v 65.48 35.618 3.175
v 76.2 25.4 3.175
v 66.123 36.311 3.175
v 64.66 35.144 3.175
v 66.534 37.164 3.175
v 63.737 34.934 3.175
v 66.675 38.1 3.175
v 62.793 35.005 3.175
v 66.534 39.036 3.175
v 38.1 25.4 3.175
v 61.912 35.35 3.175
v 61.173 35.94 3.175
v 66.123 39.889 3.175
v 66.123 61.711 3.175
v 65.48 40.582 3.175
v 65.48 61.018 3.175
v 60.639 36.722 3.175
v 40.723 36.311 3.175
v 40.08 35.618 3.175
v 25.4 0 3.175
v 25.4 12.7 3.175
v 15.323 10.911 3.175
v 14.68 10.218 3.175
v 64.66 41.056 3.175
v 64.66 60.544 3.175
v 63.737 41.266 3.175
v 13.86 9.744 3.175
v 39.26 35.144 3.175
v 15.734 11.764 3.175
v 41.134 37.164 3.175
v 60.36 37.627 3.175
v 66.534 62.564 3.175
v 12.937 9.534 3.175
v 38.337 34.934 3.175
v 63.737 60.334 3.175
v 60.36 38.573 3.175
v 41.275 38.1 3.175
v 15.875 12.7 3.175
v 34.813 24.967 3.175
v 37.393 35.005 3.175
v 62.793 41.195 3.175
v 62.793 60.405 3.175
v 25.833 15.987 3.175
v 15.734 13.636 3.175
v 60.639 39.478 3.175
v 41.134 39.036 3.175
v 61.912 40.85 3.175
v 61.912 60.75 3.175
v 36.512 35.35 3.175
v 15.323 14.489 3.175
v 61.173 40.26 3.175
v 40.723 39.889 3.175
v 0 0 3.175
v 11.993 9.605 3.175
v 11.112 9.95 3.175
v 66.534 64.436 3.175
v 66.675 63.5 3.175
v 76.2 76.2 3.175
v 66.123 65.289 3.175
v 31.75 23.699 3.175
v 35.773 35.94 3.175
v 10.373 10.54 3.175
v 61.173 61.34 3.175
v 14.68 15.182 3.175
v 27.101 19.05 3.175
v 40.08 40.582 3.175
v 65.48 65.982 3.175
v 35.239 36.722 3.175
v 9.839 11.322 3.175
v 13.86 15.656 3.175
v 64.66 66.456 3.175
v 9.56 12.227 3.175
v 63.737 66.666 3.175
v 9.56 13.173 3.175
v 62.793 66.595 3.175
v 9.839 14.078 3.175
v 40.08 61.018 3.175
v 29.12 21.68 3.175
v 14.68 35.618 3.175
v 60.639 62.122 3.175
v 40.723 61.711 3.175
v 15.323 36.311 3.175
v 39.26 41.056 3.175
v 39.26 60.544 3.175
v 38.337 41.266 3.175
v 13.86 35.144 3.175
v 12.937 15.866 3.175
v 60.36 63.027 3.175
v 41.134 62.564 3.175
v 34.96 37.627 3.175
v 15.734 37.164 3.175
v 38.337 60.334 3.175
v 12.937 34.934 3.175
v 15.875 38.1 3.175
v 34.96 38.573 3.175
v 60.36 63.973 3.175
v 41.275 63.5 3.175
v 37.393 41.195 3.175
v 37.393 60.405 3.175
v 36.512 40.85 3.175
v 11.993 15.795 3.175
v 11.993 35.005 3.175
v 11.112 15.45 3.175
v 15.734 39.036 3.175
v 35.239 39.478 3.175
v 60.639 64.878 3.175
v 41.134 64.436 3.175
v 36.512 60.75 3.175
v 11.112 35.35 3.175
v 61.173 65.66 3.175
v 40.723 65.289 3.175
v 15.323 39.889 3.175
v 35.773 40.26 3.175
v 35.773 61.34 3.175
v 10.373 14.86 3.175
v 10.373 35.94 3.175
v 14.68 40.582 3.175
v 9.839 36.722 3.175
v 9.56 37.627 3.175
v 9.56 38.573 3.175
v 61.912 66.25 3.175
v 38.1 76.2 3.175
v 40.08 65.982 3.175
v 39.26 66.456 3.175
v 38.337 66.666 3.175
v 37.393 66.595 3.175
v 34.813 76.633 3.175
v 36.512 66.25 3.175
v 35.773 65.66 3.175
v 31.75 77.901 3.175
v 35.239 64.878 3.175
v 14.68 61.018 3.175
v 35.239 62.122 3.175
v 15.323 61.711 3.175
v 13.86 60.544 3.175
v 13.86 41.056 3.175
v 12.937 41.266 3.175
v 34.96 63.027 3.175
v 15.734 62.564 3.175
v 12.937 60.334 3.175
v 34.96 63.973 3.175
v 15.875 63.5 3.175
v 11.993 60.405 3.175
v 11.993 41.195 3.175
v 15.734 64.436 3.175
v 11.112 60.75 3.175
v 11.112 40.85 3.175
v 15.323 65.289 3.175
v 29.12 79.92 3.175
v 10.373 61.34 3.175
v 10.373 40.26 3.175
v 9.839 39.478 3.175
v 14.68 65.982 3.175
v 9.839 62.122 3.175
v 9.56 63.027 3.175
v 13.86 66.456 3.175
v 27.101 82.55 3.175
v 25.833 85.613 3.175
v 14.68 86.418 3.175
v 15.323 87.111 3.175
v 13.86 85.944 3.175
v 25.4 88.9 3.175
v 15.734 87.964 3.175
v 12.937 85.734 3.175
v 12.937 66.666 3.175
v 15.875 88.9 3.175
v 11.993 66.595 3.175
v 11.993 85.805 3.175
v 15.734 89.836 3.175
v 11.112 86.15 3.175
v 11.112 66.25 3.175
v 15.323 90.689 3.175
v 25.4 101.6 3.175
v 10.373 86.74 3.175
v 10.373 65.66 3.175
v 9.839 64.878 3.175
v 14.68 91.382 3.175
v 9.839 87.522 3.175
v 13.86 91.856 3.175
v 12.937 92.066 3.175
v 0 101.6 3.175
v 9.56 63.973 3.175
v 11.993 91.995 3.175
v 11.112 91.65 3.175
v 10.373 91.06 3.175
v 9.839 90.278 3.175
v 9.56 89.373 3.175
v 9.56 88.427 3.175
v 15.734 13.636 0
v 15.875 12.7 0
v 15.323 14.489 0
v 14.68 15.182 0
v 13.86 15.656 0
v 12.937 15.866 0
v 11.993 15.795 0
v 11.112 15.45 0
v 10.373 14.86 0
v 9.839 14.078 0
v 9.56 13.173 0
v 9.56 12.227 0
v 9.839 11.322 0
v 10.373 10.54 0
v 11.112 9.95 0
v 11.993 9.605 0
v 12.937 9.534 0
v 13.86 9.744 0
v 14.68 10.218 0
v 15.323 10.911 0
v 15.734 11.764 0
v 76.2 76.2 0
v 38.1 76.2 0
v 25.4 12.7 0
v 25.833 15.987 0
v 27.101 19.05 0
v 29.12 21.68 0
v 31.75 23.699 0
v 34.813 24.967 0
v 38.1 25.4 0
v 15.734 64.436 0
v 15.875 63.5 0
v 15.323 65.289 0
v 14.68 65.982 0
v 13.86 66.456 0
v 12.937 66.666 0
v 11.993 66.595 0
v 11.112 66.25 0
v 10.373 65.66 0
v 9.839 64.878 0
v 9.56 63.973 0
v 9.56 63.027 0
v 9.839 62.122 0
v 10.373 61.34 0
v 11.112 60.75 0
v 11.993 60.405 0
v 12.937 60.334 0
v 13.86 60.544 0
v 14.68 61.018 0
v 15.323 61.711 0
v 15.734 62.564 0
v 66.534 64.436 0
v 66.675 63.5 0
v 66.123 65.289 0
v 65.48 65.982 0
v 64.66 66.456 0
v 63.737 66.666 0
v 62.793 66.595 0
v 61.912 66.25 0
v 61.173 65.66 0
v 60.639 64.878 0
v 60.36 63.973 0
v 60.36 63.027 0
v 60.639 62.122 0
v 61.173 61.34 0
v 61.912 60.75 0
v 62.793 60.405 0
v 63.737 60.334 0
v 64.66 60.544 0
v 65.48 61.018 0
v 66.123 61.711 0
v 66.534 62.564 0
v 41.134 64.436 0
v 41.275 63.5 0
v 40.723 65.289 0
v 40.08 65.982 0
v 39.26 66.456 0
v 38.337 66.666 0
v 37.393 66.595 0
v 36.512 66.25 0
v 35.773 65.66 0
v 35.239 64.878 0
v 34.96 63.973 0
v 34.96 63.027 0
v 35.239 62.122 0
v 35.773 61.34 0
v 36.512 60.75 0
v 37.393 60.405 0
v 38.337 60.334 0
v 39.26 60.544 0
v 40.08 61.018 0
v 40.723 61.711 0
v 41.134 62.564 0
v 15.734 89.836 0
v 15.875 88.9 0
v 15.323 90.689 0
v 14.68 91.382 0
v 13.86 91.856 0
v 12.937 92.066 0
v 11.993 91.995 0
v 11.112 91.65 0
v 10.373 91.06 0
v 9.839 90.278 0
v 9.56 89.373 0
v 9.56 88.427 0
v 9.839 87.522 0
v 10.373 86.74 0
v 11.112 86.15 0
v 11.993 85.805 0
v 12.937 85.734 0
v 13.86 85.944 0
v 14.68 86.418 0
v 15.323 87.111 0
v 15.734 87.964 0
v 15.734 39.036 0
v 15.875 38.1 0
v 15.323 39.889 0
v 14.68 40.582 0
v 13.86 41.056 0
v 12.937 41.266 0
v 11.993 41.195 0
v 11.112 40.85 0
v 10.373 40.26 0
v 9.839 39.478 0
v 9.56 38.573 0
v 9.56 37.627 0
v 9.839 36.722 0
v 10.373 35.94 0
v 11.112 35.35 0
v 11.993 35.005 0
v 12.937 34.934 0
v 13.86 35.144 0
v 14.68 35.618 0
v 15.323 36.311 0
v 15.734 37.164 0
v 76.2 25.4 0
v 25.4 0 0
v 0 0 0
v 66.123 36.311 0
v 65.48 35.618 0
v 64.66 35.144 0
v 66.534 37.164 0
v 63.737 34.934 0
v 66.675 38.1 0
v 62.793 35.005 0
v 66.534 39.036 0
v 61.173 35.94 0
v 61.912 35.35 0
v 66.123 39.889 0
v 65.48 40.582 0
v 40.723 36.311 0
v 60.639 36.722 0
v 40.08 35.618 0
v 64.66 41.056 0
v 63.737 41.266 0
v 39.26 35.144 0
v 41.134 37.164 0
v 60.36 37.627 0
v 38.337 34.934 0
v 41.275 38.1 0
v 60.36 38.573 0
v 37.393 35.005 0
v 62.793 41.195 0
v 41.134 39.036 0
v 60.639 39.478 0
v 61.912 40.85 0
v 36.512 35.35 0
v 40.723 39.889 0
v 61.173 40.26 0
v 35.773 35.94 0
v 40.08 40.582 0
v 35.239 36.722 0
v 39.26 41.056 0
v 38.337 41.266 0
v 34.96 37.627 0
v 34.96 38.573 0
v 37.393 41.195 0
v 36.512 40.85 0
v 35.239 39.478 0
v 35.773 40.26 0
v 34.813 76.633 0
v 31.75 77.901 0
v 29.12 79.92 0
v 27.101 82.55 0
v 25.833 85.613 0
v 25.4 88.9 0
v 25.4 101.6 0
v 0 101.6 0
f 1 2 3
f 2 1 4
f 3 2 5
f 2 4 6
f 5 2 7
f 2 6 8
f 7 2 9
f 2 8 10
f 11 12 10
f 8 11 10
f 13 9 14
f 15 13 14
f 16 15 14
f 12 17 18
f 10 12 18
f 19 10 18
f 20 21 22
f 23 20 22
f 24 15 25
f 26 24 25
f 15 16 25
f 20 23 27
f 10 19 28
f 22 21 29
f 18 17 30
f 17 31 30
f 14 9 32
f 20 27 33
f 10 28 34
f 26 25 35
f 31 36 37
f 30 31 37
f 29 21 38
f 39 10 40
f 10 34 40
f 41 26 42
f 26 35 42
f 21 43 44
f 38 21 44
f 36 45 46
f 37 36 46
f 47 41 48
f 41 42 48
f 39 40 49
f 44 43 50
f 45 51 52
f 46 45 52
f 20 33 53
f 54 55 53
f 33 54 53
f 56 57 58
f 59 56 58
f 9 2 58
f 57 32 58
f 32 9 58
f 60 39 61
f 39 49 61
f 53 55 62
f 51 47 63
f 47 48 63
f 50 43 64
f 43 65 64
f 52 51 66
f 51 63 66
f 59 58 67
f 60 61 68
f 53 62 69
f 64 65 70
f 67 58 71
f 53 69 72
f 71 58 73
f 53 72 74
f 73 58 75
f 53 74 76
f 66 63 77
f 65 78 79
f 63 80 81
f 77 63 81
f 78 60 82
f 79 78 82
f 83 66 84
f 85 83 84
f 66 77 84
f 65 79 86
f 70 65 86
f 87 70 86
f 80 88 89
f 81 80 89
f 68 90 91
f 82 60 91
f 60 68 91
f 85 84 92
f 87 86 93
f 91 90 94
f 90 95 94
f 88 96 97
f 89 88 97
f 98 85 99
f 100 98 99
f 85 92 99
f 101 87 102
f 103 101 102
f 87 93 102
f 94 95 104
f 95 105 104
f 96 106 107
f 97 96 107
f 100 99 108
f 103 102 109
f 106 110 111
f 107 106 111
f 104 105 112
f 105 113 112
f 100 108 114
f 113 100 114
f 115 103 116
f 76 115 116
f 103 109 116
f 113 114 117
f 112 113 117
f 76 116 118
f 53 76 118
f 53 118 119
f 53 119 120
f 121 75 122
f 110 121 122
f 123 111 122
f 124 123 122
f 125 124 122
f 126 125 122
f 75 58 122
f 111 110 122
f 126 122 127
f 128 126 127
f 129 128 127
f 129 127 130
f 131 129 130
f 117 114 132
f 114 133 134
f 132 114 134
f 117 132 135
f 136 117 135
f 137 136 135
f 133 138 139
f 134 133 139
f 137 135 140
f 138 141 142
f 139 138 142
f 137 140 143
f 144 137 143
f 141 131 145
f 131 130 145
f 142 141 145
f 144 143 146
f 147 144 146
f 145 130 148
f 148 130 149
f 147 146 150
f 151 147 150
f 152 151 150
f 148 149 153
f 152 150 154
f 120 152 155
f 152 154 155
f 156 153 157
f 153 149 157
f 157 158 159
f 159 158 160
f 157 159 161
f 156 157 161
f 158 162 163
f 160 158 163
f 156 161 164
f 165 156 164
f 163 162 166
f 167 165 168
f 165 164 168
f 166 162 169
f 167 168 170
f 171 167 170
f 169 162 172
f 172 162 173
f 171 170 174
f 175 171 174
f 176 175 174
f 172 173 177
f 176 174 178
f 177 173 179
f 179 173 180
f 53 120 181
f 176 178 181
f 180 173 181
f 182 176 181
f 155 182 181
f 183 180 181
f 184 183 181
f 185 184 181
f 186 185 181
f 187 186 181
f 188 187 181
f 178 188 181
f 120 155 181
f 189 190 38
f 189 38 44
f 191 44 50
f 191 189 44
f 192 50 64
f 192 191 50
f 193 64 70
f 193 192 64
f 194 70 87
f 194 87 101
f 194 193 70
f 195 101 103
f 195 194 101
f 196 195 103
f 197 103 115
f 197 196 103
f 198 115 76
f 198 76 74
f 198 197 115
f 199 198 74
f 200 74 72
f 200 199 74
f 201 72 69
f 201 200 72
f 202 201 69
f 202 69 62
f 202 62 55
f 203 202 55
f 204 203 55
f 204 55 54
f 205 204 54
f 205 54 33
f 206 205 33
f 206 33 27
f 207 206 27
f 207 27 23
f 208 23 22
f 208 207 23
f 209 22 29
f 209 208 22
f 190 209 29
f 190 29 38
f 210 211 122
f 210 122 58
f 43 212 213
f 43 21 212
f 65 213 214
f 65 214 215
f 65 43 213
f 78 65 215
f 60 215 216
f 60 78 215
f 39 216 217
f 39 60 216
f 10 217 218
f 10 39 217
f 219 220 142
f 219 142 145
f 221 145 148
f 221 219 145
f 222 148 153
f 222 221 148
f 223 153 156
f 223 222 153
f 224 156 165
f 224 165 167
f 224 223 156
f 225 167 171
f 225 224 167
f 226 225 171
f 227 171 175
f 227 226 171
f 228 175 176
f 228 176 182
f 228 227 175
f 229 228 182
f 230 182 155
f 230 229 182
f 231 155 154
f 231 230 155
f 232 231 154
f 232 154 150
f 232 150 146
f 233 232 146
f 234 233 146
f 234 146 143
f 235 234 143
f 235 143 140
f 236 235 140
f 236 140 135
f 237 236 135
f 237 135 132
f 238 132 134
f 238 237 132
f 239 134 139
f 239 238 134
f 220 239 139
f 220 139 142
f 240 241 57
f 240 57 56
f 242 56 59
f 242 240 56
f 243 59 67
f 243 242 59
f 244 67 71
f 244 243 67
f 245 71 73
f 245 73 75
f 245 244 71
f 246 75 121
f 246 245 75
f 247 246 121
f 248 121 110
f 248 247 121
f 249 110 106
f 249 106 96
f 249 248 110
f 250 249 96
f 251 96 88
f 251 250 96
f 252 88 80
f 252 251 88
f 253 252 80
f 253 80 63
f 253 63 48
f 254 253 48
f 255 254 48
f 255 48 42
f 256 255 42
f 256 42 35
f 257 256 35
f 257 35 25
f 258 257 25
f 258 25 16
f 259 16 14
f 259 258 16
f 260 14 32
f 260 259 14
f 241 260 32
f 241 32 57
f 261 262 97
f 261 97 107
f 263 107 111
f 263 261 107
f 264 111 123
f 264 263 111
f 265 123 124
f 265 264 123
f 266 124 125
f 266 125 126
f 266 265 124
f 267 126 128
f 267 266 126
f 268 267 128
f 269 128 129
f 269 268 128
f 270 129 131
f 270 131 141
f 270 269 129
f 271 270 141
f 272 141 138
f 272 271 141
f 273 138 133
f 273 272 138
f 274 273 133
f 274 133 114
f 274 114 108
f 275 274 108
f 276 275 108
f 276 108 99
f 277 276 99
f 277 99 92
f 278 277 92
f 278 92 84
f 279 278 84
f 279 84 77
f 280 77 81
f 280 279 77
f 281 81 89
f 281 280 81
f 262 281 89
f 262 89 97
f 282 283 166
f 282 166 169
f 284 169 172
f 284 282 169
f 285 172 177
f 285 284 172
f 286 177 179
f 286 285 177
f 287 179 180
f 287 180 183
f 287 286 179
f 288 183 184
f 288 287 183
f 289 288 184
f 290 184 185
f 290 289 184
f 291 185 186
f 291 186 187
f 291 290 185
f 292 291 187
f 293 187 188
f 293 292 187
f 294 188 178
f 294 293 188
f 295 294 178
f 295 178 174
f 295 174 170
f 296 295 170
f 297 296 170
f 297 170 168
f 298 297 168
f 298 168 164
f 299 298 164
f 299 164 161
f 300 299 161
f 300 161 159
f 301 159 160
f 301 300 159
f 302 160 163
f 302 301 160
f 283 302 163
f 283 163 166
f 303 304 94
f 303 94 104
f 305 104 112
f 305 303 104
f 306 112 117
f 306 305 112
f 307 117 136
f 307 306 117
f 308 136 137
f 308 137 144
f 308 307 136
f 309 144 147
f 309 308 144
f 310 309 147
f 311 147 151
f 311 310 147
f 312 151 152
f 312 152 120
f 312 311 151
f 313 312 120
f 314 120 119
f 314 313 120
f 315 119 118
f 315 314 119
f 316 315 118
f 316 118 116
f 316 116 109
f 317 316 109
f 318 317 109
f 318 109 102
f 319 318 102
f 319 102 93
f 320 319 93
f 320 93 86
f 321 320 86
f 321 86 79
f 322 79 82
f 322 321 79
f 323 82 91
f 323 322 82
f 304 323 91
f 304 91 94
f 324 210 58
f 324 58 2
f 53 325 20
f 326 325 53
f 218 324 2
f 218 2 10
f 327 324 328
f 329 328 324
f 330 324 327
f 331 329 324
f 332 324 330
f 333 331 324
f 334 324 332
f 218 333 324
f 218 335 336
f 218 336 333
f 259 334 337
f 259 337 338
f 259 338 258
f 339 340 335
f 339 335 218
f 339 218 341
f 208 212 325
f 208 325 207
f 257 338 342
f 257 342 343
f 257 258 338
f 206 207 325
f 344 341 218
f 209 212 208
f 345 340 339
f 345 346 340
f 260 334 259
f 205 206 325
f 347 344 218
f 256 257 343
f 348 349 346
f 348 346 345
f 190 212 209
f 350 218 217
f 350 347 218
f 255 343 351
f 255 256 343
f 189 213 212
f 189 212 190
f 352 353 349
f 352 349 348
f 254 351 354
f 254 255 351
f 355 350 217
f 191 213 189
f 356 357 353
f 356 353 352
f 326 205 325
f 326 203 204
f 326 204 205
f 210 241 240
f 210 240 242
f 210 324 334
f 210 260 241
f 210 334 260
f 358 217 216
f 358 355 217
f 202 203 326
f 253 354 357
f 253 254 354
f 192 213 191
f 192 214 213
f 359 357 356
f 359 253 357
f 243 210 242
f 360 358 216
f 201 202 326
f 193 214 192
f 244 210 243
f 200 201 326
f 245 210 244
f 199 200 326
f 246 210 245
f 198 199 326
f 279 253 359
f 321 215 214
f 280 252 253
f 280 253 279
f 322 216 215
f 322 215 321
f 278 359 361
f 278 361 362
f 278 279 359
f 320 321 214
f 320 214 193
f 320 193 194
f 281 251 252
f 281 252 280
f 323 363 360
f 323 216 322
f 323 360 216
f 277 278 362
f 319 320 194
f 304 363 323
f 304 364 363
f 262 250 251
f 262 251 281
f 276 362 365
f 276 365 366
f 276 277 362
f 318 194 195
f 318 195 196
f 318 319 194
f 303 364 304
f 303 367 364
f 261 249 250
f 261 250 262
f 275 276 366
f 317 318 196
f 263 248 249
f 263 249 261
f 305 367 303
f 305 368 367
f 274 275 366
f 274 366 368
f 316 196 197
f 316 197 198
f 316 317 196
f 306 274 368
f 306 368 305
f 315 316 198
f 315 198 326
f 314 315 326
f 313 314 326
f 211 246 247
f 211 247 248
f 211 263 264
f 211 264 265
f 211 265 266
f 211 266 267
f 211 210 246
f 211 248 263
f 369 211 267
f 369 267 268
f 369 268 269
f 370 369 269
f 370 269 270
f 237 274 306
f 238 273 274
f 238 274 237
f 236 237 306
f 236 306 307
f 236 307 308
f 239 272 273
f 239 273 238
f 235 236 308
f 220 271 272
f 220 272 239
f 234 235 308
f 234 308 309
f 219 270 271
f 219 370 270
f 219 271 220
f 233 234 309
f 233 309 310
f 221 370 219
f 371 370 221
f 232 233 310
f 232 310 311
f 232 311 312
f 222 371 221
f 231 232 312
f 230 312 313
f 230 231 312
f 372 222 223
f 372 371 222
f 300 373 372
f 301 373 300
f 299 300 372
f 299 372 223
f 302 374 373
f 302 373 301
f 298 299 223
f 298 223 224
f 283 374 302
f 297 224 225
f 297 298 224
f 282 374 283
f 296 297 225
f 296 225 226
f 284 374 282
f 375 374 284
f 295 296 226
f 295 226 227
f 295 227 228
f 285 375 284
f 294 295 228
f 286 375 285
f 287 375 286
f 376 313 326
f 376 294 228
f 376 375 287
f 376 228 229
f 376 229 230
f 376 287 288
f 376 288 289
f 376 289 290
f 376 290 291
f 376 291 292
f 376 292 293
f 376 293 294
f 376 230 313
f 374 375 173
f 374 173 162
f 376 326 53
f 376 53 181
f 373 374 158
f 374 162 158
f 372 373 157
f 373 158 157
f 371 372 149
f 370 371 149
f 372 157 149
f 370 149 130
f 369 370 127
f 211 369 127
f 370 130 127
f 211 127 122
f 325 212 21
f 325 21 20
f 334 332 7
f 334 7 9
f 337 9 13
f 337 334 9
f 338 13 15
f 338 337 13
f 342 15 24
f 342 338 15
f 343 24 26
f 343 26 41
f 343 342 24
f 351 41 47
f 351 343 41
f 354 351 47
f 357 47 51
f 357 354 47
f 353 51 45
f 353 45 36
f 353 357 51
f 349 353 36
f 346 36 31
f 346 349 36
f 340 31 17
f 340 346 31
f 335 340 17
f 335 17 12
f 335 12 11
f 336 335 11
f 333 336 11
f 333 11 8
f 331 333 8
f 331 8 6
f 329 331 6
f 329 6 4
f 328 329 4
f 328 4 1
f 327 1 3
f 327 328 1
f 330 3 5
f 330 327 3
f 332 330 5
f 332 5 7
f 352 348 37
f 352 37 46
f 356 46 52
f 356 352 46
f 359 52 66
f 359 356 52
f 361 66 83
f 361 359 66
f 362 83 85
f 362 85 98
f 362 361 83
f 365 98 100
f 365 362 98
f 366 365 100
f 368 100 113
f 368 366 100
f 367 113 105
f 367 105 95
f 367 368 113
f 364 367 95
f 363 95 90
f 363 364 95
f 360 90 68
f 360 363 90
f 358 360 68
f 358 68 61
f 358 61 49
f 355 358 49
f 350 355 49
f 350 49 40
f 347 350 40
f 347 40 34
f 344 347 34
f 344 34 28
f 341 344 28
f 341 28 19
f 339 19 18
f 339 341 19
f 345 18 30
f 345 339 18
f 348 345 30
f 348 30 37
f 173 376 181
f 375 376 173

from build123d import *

# Parameters (mm, degrees)
SKETCH1_R           = 3.175
BOSS_EXTRUDE1_DEPTH = 3.175
FILLET1_R           = 12.7


with BuildPart() as part:
    # Sketch1 → Boss-Extrude1 (new body)
    with BuildSketch(Plane.XY):
        Polygon((0, 0), (0, 101.6), (25.4, 101.6), (25.4, 76.2), (76.2, 76.2), (76.2, 25.4), (25.4, 25.4), (25.4, 0), align=None)
        with Locations((12.7, 88.9)):
            Circle(SKETCH1_R, mode=Mode.SUBTRACT)
        with Locations((12.7, 63.5)):
            Circle(SKETCH1_R, mode=Mode.SUBTRACT)
        with Locations((12.7, 38.1)):
            Circle(SKETCH1_R, mode=Mode.SUBTRACT)
        with Locations((12.7, 12.7)):
            Circle(SKETCH1_R, mode=Mode.SUBTRACT)
        with Locations((38.1, 63.5)):
            Circle(SKETCH1_R, mode=Mode.SUBTRACT)
        with Locations((38.1, 38.1)):
            Circle(SKETCH1_R, mode=Mode.SUBTRACT)
        with Locations((63.5, 63.5)):
            Circle(SKETCH1_R, mode=Mode.SUBTRACT)
        with Locations((63.5, 38.1)):
            Circle(SKETCH1_R, mode=Mode.SUBTRACT)
    extrude(amount=BOSS_EXTRUDE1_DEPTH)

    # Fillet1
    fillet1_edges = [part.edges().sort_by_distance(p)[0] for p in [
        (25.4, 76.2, 1.5875),
        (25.4, 25.4, 1.5875),
    ]]
    fillet(fillet1_edges, radius=FILLET1_R)


solid = part.part
